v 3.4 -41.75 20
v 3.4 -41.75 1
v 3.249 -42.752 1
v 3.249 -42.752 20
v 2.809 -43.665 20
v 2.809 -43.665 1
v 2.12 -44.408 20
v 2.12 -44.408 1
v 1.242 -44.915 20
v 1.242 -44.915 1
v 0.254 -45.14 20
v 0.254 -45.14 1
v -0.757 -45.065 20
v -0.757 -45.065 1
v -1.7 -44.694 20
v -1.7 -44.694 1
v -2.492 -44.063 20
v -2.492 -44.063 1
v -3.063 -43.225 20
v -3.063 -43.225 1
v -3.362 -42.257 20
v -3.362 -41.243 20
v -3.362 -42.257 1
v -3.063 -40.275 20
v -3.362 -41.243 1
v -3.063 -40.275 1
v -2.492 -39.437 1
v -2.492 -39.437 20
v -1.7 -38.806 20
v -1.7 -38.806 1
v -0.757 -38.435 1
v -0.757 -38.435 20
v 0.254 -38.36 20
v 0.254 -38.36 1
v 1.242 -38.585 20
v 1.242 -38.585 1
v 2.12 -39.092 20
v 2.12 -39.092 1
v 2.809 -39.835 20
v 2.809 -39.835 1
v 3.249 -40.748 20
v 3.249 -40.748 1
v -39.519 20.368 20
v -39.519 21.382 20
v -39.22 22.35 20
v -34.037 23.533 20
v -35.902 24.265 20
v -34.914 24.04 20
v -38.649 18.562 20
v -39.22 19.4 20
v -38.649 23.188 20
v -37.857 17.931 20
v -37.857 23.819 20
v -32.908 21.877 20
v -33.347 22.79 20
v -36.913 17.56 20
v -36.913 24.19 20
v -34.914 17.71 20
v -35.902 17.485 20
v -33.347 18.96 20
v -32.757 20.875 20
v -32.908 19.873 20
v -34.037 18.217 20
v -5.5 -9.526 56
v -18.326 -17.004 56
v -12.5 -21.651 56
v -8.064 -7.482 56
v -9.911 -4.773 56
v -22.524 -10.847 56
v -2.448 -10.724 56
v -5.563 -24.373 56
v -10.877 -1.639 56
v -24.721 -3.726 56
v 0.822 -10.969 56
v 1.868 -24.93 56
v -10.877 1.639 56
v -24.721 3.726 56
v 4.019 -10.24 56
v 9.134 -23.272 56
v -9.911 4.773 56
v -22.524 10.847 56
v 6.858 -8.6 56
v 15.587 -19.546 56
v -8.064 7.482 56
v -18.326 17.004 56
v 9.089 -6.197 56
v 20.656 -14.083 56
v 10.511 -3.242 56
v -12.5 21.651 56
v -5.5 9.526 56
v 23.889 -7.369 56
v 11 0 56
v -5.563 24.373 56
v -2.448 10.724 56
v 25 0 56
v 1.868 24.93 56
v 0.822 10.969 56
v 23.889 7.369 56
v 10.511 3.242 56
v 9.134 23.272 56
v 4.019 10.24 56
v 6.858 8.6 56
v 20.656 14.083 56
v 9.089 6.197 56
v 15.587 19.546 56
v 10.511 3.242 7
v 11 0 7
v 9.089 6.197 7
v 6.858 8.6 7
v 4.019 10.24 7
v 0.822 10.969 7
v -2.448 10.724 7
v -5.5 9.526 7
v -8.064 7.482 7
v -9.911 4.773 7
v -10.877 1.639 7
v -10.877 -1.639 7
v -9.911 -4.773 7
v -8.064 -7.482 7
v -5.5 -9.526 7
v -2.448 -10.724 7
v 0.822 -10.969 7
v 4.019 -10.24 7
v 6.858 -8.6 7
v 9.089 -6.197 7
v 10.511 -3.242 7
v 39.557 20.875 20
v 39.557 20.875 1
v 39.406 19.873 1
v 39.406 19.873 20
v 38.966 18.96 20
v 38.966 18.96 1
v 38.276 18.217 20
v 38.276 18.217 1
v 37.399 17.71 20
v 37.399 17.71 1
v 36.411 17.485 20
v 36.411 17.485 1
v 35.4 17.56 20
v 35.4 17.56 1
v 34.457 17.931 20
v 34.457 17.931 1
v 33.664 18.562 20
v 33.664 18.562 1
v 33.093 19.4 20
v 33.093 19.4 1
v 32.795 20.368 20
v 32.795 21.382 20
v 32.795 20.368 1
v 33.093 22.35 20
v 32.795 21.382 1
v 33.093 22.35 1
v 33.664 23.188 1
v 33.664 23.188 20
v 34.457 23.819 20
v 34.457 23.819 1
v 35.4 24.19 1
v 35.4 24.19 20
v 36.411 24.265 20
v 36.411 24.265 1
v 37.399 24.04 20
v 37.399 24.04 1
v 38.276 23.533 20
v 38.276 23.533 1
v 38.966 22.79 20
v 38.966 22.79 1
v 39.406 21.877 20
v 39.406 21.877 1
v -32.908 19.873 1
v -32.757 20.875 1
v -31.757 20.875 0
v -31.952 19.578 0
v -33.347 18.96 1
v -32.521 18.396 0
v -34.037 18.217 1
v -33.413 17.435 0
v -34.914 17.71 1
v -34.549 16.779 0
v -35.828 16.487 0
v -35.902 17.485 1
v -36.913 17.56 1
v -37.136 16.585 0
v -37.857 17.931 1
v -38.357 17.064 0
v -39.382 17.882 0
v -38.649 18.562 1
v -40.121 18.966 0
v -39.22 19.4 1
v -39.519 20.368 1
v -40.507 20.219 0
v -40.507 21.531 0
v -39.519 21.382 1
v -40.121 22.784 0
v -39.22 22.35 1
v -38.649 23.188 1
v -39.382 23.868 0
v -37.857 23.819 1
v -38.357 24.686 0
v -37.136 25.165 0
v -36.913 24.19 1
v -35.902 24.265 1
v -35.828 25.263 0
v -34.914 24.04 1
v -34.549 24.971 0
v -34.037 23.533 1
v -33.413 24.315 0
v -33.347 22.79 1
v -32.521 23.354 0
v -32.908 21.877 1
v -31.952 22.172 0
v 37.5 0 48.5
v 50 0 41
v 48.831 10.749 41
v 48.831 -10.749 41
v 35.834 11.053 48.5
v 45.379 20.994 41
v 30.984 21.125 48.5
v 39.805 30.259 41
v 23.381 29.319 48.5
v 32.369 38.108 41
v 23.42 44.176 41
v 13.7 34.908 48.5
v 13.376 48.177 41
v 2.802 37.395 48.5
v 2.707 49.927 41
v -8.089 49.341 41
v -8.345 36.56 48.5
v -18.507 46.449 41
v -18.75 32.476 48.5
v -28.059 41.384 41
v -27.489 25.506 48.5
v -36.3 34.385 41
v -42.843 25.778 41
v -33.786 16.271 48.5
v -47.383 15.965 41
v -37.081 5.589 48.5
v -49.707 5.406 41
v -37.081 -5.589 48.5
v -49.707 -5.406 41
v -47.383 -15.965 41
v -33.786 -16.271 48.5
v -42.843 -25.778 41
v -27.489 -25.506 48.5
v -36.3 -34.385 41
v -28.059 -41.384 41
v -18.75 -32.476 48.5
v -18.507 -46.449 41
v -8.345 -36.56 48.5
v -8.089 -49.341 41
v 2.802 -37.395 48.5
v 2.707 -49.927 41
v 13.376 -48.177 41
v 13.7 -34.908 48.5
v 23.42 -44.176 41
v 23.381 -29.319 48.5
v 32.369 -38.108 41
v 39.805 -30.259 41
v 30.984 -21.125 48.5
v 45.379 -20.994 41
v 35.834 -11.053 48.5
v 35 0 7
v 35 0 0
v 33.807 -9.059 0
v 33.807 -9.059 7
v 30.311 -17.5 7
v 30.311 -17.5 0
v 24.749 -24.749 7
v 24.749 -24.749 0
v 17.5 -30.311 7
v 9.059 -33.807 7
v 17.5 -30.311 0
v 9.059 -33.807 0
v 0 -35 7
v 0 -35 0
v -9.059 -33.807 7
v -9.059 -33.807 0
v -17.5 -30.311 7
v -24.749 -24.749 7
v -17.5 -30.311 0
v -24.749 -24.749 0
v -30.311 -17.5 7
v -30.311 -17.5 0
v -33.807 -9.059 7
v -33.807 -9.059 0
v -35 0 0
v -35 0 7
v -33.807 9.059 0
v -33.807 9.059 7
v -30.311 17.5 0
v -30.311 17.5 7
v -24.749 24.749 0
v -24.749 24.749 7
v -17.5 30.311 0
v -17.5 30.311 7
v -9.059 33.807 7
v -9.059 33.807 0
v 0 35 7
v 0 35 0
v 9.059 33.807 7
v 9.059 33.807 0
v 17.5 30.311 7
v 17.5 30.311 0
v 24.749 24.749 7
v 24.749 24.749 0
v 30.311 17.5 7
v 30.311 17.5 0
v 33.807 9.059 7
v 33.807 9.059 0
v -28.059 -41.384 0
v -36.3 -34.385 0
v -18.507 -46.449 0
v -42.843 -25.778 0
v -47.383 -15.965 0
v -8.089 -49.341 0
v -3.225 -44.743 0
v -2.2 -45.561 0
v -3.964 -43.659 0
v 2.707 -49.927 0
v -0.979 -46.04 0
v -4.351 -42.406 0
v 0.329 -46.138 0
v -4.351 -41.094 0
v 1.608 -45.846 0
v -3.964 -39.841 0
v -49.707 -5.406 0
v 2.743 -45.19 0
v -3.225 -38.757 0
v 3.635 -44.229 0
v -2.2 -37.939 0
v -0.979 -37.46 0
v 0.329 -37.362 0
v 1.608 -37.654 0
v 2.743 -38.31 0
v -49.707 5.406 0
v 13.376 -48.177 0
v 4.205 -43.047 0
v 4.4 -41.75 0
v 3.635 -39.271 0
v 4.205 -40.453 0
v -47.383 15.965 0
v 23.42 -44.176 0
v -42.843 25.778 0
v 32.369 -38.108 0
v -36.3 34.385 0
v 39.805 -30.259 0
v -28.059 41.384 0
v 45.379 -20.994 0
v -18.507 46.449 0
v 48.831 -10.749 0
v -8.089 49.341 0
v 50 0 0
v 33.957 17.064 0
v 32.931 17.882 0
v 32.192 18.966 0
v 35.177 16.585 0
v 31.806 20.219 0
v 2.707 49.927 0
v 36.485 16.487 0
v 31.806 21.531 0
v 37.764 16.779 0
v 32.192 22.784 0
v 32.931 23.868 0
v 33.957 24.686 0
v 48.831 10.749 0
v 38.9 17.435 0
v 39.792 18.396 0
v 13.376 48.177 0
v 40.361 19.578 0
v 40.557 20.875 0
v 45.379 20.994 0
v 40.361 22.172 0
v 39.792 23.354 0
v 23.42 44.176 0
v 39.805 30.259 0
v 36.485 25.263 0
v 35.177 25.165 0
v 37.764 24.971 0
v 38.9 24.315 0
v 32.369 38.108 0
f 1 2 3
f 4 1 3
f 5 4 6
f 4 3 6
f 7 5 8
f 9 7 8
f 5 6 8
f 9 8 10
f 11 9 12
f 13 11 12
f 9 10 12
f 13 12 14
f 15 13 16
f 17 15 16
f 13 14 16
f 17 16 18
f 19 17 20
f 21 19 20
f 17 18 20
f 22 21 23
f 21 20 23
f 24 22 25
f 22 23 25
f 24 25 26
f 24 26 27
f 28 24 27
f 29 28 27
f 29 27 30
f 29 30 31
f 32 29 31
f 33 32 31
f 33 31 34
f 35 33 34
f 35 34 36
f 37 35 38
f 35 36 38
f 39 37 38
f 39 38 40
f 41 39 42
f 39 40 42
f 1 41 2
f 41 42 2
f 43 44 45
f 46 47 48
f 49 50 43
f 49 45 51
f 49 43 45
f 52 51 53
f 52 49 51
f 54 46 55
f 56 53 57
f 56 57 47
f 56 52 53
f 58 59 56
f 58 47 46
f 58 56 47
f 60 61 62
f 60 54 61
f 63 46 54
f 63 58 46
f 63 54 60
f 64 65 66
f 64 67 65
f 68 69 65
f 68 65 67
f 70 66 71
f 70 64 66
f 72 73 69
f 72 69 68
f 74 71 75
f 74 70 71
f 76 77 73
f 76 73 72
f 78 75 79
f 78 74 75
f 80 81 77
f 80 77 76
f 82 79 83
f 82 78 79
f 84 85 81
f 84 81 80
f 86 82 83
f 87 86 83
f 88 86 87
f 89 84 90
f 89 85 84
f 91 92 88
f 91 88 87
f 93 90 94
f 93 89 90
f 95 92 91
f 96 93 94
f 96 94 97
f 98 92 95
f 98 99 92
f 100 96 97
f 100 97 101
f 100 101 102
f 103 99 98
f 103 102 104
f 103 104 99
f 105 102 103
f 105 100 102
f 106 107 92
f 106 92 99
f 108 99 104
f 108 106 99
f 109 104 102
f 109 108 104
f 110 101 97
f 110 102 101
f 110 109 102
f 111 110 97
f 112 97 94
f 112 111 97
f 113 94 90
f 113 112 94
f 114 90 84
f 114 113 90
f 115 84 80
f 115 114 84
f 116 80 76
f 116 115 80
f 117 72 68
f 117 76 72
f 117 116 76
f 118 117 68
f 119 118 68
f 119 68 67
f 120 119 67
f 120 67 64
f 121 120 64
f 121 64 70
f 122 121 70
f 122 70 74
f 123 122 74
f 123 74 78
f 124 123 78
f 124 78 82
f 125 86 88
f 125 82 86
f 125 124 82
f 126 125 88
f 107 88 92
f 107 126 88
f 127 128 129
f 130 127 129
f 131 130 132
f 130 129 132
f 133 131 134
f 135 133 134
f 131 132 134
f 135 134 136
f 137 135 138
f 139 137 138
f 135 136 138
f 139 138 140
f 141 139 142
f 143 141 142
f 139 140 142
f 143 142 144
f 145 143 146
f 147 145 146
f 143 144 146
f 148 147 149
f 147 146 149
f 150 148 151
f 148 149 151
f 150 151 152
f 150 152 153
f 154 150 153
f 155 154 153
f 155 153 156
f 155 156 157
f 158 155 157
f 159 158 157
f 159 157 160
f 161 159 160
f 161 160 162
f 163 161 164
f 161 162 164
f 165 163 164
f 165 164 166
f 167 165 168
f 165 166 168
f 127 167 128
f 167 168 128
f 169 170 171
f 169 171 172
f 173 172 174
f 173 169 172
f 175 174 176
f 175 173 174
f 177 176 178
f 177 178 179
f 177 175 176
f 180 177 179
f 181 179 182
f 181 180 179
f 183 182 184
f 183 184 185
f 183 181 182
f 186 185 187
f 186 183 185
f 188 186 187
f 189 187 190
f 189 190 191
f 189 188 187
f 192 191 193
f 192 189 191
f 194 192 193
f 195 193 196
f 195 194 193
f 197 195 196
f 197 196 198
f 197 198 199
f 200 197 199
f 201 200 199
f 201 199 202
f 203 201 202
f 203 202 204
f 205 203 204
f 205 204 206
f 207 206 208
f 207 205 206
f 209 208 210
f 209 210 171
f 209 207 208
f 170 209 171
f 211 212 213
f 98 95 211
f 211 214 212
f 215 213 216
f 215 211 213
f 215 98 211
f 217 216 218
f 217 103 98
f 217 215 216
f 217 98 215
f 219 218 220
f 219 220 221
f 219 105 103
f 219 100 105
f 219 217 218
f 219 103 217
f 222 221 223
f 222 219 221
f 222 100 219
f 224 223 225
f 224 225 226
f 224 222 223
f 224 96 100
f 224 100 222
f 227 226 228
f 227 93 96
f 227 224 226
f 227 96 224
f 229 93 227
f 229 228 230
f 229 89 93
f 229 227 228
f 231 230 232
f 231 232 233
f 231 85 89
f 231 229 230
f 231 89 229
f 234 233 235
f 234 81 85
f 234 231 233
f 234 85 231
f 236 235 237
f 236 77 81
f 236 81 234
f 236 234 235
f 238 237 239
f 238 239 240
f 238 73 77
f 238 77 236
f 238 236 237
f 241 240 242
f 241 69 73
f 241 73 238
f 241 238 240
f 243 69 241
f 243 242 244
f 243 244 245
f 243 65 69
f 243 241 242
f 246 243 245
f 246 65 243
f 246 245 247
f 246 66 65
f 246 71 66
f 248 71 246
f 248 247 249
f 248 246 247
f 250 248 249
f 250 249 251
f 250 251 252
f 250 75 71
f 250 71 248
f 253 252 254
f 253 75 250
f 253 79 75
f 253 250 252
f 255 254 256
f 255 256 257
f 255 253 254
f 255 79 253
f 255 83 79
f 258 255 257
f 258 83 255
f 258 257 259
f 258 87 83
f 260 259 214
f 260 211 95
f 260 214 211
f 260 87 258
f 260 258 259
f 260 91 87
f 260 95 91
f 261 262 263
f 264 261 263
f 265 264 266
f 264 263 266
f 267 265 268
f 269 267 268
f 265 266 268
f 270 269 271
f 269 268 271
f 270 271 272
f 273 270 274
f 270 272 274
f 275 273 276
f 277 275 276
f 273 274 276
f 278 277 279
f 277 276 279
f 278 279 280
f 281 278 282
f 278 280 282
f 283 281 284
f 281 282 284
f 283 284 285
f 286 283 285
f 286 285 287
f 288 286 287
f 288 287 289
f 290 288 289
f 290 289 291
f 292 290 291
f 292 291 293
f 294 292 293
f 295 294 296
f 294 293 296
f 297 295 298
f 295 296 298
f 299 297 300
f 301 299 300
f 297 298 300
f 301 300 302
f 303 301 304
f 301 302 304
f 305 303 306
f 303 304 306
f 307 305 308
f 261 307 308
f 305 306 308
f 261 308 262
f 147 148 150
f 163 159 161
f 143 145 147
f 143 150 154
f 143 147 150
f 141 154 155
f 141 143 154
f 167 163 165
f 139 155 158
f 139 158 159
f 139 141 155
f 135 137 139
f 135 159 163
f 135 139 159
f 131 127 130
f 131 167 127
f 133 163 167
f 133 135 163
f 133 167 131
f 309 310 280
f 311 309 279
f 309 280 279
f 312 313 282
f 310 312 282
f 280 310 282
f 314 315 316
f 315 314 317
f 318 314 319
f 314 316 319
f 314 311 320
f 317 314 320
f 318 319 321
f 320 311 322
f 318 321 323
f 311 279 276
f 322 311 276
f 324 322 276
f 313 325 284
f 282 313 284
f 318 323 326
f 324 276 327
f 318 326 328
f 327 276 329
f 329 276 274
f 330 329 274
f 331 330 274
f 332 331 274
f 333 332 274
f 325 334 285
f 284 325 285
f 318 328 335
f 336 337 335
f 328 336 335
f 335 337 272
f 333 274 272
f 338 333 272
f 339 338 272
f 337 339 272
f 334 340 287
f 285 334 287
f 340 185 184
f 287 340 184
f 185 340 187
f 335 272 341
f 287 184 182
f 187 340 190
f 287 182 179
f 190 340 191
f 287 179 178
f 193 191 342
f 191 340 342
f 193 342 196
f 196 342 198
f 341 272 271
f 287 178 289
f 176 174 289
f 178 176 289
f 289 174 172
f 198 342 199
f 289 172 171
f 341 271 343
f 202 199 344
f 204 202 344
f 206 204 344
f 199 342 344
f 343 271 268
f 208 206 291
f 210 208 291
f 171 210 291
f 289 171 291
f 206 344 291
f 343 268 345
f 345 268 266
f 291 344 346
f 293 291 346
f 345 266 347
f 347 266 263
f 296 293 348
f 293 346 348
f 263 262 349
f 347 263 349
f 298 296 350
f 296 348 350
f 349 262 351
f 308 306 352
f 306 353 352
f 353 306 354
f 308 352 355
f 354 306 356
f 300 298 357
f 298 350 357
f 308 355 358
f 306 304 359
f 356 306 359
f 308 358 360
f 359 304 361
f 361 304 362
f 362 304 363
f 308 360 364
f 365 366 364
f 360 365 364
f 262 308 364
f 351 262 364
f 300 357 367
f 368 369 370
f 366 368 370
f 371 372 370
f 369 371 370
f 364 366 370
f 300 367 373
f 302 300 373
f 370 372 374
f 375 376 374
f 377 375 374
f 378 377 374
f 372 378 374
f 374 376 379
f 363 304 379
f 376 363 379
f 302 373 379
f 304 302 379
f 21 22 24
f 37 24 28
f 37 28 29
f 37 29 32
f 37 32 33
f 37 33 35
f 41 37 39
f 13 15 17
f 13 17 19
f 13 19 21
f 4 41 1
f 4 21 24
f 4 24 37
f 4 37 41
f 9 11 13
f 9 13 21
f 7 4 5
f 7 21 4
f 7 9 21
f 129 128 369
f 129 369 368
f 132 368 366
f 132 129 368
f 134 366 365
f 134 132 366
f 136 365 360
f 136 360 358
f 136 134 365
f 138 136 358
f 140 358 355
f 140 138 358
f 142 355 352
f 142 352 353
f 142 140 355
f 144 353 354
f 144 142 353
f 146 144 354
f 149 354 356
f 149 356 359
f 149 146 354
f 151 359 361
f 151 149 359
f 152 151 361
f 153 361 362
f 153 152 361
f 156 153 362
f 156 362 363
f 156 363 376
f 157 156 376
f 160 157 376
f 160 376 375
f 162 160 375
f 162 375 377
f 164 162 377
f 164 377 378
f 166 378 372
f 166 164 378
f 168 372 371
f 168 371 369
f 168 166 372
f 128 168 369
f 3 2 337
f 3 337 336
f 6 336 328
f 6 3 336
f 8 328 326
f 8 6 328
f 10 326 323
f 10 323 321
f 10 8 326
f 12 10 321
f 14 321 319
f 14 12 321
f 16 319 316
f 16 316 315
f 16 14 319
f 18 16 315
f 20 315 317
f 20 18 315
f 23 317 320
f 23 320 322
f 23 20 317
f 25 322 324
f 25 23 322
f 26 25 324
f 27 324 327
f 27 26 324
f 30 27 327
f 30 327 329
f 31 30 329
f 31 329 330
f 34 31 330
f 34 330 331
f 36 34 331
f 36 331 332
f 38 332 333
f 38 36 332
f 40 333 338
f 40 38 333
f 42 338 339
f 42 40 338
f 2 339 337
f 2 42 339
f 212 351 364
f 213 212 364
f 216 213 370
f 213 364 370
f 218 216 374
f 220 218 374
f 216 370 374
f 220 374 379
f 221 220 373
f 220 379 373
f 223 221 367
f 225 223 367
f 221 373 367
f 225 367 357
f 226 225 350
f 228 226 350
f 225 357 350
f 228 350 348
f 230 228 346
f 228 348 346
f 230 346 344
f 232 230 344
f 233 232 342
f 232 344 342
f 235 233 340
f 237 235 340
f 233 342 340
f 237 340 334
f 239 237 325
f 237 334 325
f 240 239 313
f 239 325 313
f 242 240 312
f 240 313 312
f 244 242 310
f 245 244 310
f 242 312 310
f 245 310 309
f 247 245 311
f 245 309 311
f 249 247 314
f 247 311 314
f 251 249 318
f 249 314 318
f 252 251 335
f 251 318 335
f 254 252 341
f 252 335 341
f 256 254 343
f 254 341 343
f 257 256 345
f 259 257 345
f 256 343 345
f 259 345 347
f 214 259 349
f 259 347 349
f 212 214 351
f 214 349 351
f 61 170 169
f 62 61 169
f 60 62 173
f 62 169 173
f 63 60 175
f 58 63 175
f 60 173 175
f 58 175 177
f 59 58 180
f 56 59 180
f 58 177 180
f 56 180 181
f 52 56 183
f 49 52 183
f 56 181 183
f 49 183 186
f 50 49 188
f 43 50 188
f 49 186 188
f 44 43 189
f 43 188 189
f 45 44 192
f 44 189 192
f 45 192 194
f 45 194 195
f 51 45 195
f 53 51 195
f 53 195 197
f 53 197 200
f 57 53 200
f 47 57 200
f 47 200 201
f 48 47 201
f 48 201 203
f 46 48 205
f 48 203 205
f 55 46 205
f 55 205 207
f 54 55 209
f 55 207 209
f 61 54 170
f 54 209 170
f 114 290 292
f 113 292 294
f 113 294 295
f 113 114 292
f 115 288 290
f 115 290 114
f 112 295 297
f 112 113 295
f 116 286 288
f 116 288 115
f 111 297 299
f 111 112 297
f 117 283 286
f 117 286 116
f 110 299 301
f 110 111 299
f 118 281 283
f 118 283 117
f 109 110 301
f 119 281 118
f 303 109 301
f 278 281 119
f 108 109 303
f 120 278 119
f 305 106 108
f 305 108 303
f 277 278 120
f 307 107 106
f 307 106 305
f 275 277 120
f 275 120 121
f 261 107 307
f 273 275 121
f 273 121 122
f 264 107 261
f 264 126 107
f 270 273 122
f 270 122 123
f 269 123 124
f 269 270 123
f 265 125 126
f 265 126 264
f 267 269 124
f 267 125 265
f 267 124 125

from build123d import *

# Parameters (mm, degrees)
SKETCH_R        = 50
PAD_DEPTH       = 56
SKETCH004_R     = 11
POCKET_DEPTH    = 56.001
SKETCH003_R     = 35
POCKET001_DEPTH = 7
CHAMFER_SIZE2   = 25
CHAMFER_SIZE    = 15
SKETCH005_R     = 3.4
POCKET002_DEPTH = 20
CHAMFER001_SIZE = 1


with BuildPart() as part:
    # Sketch → Pad (new body)
    with BuildSketch(Plane.XY):
        Circle(SKETCH_R)
    extrude(amount=PAD_DEPTH)

    # Sketch004 → Pocket (cut, through all)
    with BuildSketch(Plane.XY):
        Circle(SKETCH004_R)
    extrude(amount=POCKET_DEPTH, mode=Mode.SUBTRACT)

    # Sketch003 → Pocket001 (cut)
    with BuildSketch(Plane(origin=(0, 0, 0), x_dir=(1, 0, 0), z_dir=(0, 0, -1))):
        Circle(SKETCH003_R)
    extrude(amount=-POCKET001_DEPTH, mode=Mode.SUBTRACT)

    # Chamfer
    chamfer_edges = [part.edges().sort_by_distance(p)[0] for p in [
        (-50, 0, 56),
    ]]
    chamfer_side = part.faces().sort_by_distance((-50, 0, 28))[0]
    chamfer(chamfer_edges, length=CHAMFER_SIZE, length2=CHAMFER_SIZE2, reference=chamfer_side)

    # Sketch005 (on Face3 of Chamfer) → Pocket002 (cut)
    with BuildSketch(Plane(origin=(0, 0, 0), x_dir=(1, 0, 0), z_dir=(0, 0, -1))):
        with Locations((0, 41.75)):
            Circle(SKETCH005_R)
        with Locations((36.156561, -20.875)):
            Circle(SKETCH005_R)
        with Locations((-36.156561, -20.875)):
            Circle(SKETCH005_R)
    extrude(amount=-POCKET002_DEPTH, mode=Mode.SUBTRACT)

    # Chamfer001
    chamfer001_edges = [part.edges().sort_by_distance(p)[0] for p in [
        (32.756561, 20.875, 0),
        (-3.4, -41.75, 0),
        (-39.556561, 20.875, 0),
    ]]
    chamfer(chamfer001_edges, length=CHAMFER001_SIZE)


solid = part.part
